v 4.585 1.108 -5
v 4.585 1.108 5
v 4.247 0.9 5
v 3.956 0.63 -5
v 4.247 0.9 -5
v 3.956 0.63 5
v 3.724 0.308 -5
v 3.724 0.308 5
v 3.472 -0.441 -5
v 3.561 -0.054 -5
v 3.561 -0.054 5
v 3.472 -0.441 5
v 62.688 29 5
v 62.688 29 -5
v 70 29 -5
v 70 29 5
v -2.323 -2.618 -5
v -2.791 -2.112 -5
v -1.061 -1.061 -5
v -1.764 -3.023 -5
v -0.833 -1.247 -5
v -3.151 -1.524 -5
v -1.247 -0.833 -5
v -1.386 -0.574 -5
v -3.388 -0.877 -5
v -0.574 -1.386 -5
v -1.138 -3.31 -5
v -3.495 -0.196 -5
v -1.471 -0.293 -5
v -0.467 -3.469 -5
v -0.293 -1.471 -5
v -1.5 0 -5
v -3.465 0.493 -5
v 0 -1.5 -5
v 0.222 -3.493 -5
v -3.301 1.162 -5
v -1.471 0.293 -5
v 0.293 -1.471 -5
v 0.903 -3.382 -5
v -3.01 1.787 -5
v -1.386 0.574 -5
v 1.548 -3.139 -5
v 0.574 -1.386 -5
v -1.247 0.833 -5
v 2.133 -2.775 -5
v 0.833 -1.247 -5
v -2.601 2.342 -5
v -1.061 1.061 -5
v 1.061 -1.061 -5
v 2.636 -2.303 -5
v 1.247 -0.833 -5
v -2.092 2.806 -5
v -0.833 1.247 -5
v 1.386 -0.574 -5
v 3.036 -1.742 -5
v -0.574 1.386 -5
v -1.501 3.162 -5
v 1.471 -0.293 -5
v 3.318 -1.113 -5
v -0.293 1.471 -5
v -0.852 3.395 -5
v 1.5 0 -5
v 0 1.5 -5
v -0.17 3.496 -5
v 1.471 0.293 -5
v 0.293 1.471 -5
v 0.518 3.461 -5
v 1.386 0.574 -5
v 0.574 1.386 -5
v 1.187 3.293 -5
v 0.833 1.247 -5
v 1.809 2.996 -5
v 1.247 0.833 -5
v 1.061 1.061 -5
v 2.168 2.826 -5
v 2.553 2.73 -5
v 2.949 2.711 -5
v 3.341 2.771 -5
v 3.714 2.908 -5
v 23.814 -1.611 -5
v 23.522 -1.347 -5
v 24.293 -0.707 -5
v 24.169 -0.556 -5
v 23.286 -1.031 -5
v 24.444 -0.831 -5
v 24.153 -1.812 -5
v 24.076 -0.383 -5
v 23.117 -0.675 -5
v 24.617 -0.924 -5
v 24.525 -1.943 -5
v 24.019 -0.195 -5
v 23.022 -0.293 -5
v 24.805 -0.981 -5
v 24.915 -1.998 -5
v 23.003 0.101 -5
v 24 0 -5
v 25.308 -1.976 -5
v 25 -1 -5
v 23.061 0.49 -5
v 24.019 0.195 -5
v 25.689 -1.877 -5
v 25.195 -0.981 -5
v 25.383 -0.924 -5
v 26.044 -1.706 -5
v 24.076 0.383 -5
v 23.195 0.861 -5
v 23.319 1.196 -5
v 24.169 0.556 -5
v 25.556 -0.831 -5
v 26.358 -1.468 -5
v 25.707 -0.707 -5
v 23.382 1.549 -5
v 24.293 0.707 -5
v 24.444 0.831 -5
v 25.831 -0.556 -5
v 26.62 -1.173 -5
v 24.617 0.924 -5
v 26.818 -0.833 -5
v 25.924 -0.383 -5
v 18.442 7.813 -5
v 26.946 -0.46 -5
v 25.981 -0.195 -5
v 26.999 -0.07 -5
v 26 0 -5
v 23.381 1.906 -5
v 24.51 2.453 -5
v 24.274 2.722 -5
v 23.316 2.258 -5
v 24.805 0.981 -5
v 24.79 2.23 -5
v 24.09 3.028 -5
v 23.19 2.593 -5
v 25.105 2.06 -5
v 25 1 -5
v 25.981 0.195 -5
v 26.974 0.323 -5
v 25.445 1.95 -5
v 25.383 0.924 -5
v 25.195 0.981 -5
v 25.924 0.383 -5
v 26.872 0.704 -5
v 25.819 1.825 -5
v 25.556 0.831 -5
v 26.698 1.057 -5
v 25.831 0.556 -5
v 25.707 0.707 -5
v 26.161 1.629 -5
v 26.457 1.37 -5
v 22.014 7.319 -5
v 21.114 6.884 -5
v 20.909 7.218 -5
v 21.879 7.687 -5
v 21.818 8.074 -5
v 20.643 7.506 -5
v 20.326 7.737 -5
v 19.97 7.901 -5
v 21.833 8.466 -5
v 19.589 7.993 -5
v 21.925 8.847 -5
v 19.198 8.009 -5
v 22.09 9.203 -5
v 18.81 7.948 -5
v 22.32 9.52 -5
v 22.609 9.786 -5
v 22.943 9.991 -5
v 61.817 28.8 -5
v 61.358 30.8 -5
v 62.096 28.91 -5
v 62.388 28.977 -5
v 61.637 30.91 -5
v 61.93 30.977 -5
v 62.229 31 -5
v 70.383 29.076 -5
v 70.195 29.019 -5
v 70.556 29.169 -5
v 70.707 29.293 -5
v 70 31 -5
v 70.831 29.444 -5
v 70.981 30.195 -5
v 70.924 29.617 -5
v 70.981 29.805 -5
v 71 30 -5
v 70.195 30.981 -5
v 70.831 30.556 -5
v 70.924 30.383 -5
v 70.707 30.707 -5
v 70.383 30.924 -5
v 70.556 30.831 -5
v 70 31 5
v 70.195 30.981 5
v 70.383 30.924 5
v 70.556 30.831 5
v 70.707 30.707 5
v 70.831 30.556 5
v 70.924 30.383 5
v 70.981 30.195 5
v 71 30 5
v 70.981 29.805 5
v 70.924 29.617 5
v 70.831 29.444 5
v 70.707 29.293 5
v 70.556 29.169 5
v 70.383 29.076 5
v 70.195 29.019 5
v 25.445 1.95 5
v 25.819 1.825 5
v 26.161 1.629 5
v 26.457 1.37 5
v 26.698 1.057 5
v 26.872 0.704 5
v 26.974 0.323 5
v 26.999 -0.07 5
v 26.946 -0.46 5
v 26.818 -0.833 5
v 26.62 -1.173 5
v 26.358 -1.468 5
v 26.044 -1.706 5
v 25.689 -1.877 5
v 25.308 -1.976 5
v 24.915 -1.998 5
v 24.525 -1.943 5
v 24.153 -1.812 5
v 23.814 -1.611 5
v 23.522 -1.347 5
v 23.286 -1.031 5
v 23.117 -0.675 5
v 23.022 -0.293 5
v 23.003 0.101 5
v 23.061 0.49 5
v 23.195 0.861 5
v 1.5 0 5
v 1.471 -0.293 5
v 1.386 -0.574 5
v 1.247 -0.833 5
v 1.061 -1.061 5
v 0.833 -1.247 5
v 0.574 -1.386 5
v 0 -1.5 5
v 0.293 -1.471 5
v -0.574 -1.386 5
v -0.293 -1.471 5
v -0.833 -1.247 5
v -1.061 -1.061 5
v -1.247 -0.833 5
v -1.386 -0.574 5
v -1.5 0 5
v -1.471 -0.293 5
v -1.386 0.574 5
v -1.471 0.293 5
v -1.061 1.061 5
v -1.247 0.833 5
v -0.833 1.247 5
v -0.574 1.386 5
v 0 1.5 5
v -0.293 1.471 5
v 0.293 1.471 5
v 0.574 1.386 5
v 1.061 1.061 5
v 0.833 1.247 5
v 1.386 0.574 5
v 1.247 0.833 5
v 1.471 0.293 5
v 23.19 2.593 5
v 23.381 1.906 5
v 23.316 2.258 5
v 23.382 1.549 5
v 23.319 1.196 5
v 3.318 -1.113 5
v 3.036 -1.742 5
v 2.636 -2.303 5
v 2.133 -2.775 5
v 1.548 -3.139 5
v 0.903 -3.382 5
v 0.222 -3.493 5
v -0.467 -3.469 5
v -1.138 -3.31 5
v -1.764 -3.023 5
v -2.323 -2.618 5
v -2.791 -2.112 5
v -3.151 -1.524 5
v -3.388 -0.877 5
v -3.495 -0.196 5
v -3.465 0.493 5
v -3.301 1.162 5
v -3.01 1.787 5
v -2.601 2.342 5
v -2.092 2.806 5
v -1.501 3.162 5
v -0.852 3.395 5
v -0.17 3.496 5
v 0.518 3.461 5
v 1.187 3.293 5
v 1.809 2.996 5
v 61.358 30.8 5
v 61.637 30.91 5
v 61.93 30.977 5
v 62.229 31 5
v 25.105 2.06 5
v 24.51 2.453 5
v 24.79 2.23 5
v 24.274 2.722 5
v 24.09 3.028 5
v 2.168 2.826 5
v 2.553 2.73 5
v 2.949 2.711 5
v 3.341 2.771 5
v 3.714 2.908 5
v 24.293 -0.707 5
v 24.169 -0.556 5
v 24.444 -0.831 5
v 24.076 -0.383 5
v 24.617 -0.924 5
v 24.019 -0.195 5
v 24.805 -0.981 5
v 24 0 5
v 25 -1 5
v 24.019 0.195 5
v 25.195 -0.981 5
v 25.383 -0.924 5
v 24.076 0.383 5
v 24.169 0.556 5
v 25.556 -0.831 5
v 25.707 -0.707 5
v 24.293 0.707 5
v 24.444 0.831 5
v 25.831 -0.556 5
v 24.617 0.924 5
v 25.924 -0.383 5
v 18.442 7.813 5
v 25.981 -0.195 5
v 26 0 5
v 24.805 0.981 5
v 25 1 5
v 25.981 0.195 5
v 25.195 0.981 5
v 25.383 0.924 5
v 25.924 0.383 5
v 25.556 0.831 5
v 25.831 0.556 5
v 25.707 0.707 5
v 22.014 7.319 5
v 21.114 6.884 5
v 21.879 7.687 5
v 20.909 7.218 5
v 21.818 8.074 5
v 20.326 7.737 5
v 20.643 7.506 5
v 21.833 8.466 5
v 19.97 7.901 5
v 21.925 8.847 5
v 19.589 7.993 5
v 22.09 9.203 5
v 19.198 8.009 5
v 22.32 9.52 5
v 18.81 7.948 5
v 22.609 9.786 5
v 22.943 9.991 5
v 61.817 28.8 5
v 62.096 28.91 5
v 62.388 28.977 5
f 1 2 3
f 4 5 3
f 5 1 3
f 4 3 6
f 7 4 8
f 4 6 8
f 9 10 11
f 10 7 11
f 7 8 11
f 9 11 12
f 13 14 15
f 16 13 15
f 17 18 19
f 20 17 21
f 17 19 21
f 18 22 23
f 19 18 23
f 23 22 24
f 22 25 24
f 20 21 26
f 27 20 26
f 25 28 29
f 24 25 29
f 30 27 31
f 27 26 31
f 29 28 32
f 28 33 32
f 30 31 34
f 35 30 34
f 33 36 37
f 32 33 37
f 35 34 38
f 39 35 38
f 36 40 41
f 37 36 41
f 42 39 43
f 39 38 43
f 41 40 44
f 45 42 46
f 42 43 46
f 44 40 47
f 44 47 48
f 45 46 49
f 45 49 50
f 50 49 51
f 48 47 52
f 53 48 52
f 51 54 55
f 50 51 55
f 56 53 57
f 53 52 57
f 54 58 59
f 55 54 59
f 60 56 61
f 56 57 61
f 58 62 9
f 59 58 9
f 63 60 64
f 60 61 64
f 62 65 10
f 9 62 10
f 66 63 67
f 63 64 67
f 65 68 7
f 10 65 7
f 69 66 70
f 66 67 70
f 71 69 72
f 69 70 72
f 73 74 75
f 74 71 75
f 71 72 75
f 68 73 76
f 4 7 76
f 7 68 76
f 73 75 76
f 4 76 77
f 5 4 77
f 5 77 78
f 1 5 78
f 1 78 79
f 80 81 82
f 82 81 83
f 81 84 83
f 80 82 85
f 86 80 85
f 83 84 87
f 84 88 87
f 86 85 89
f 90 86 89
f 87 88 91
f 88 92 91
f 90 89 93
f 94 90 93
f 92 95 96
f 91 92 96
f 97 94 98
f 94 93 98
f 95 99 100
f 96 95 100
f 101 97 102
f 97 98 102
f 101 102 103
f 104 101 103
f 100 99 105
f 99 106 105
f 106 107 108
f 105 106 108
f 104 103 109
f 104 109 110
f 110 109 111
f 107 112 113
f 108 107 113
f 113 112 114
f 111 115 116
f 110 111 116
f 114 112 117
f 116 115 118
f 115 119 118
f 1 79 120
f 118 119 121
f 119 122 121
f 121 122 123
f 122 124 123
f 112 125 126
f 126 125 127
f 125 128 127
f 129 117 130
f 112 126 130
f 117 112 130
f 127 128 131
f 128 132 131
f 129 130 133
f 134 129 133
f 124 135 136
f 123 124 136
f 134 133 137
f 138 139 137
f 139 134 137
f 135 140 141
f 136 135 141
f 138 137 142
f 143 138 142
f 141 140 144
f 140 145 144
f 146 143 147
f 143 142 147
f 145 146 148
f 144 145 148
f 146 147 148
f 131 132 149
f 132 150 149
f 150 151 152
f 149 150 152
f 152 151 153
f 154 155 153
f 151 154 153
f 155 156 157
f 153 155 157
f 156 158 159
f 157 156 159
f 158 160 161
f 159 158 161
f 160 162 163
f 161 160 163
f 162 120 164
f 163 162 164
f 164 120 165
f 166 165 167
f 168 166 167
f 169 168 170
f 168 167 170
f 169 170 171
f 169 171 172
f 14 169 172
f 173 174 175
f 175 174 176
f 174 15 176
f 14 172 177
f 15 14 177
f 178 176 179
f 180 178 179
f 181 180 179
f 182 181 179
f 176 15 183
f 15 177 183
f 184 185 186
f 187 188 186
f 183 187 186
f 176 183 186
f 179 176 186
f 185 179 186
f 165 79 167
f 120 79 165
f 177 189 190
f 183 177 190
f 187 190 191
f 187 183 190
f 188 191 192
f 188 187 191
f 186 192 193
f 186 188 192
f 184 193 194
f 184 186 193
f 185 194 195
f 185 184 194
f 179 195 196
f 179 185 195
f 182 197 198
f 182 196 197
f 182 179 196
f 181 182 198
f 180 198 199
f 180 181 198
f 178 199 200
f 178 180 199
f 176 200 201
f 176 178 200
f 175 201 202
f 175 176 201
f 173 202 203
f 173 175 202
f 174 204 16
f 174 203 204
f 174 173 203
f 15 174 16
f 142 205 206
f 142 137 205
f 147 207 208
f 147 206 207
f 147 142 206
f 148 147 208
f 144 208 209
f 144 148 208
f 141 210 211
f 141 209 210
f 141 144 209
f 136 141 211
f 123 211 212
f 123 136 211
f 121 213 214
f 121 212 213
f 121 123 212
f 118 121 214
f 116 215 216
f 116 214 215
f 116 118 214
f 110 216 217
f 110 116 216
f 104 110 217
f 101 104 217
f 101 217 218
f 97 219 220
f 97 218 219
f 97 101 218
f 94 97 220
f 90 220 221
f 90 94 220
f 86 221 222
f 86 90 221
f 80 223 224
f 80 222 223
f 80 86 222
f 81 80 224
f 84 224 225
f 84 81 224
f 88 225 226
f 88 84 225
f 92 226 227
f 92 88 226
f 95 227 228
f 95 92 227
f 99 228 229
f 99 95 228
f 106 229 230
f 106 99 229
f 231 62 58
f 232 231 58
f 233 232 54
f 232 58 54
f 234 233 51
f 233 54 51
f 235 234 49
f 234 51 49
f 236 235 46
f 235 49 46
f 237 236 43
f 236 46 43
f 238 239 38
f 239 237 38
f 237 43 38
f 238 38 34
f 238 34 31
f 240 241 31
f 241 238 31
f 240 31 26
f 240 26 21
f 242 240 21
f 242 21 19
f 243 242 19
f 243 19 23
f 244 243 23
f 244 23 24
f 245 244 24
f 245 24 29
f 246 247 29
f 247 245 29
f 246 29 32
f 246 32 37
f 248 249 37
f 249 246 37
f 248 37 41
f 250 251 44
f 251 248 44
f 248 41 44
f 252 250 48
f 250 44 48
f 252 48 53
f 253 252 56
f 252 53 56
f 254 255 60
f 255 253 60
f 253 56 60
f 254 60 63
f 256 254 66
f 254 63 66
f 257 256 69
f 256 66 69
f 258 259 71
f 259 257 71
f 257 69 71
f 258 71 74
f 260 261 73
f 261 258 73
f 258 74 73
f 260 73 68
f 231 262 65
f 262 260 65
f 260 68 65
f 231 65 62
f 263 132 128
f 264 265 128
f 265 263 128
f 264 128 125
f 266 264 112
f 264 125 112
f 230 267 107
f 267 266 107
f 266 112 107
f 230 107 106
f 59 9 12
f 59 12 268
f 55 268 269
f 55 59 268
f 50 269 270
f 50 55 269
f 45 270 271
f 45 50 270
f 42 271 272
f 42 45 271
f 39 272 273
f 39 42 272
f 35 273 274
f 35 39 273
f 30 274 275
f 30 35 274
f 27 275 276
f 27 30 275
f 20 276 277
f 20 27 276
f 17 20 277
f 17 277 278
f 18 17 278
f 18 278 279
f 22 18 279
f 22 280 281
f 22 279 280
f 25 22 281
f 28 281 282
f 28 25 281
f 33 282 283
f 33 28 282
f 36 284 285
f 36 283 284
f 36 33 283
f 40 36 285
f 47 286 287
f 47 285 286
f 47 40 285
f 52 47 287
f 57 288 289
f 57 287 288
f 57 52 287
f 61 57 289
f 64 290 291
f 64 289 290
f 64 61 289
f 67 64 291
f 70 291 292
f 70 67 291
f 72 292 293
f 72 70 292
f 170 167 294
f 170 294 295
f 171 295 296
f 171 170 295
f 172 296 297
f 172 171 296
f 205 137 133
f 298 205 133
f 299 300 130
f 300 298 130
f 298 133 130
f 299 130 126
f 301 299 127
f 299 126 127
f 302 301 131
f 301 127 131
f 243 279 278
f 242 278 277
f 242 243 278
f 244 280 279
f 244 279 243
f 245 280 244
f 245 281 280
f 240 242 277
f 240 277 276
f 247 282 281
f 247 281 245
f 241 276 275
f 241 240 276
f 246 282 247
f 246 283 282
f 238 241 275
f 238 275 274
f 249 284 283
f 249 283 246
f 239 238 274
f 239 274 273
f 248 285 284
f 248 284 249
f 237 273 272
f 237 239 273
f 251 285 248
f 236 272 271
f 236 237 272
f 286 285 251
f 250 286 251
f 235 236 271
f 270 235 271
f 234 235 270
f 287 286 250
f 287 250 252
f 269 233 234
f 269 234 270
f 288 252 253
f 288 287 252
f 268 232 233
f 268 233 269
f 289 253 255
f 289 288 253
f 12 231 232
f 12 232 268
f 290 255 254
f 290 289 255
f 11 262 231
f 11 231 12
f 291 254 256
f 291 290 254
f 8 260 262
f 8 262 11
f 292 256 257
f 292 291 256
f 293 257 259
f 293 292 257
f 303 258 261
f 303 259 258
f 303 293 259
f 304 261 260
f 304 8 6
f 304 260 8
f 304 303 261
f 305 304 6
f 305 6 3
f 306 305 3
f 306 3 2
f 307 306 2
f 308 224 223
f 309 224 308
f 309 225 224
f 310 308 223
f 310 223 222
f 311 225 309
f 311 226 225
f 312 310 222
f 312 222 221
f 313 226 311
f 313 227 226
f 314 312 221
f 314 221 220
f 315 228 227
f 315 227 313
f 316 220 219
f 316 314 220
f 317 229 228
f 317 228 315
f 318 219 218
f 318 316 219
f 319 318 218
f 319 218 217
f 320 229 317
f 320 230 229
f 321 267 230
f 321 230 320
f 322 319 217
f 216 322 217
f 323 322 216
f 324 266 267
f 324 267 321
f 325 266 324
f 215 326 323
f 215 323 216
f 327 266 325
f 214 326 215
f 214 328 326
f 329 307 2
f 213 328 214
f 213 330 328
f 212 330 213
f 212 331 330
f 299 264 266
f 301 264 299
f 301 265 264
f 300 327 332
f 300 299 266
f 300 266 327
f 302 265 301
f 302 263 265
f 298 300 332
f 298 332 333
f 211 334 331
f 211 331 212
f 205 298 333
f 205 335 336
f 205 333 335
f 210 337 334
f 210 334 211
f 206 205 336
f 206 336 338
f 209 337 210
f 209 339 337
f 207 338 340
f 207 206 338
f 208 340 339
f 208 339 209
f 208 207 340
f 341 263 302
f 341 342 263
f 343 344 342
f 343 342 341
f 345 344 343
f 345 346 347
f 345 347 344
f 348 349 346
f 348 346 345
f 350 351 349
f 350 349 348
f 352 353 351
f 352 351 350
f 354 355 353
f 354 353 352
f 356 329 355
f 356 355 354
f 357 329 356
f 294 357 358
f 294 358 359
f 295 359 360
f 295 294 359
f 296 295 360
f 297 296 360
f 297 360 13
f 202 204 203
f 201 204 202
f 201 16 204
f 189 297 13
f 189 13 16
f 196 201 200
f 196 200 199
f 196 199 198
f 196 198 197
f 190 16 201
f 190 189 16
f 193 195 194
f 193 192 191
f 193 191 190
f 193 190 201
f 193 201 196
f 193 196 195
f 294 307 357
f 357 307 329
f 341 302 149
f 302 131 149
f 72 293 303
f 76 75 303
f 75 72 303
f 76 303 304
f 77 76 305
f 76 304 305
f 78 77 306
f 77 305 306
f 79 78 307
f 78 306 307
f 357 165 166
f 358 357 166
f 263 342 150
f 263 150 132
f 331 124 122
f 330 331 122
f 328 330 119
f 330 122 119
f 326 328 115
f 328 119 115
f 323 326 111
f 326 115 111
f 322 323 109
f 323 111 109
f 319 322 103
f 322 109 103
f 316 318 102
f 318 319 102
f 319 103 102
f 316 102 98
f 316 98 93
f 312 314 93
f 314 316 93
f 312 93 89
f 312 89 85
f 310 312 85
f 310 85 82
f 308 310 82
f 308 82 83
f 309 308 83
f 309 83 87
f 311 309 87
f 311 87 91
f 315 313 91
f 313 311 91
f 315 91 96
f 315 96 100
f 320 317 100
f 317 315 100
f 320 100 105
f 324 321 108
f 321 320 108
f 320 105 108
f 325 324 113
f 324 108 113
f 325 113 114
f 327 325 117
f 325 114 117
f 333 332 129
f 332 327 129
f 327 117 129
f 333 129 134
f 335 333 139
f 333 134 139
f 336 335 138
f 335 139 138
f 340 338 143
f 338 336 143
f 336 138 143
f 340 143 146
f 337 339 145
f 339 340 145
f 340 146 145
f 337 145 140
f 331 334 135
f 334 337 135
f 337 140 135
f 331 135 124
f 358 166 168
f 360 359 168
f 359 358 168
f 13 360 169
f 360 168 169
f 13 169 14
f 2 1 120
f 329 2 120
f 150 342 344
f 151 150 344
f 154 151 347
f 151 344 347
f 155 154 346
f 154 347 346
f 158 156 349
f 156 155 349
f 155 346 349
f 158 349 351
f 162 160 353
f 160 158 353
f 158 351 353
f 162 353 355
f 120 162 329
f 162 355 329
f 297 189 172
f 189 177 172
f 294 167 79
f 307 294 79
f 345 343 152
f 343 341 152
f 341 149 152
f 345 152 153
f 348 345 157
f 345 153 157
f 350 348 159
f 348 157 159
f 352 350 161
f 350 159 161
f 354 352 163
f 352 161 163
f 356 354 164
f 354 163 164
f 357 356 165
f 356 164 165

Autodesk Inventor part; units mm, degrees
ref_plane "YZ Plane" through (0, 0, 0) normal (1, 0, 0) x (0, 1, 0)
ref_plane "XZ Plane" through (0, 0, 0) normal (0, 1, 0) x (-1, 0, 0)
ref_plane "XY Plane" through (0, 0, 0) normal (0, 0, 1) x (1, 0, 0)
sketch "Sketch1" plane through (0, 0, 0) normal (0, 0, 1) x (1, 0, 0)
  line L0 (0, 0) -> (62, 30) construction
  line L1 (62, 30) -> (70, 30) construction
  line L2 (20.2572, 9.8019) -> (25, 0) construction
  circle A0 centre (0, 0) radius 1.5
  circle A1 centre (25, 0) radius 1
  arc A2 (2.5837, 2.3611) -> (3.4548, 0.5608) centre (0, 0) ccw
  arc A3 (23.7065, 1.5254) -> (24.6066, 1.9609) centre (25, 0) ccw
  line L3 (3.4548, 0.5608) -> (20.2426, 8.6839)
  line L4 (20.2426, 8.6839) -> (23.7065, 1.5254)
  line L5 (24.6066, 1.9609) -> (21.1428, 9.1195)
  line L6 (21.1428, 9.1195) -> (62.2292, 29)
  line L7 (62.2292, 29) -> (70, 29)
  arc A4 (70, 29) -> (70, 31) centre (70, 30) ccw
  line L8 (70, 31) -> (61.7708, 31)
  line L9 (61.7708, 31) -> (2.5837, 2.3611)
  dimension "d0" = 25
  dimension "d1" = 70
  dimension "d2" = 8
  dimension "d3" = 30
  dimension "d4" = 3
  dimension "d5" = 2
  dimension "d6" = 7
  dimension "d7" = 4
  dimension "d8" = 1
  dimension "d9" = 1
  dimension "d10" = 1
  dimension "d11" = 1
  dimension "d12" = 0.5
  dimension "d13" = 0.5
extrude "Extrusion1" add sketch "Sketch1" along normal mid plane 10
fillet "Fillet1" radius 2 8 edges at (3.4548, 0.5608, 0) (2.5837, 2.3611, 0) (21.1428, 9.1195, 0) (20.2426, 8.6839, 0) (62.2292, 29, 0) (61.7708, 31, 0) (24.6066, 1.9609, 0) (23.7065, 1.5254, 0)
properties material "Aluminum 6061"
